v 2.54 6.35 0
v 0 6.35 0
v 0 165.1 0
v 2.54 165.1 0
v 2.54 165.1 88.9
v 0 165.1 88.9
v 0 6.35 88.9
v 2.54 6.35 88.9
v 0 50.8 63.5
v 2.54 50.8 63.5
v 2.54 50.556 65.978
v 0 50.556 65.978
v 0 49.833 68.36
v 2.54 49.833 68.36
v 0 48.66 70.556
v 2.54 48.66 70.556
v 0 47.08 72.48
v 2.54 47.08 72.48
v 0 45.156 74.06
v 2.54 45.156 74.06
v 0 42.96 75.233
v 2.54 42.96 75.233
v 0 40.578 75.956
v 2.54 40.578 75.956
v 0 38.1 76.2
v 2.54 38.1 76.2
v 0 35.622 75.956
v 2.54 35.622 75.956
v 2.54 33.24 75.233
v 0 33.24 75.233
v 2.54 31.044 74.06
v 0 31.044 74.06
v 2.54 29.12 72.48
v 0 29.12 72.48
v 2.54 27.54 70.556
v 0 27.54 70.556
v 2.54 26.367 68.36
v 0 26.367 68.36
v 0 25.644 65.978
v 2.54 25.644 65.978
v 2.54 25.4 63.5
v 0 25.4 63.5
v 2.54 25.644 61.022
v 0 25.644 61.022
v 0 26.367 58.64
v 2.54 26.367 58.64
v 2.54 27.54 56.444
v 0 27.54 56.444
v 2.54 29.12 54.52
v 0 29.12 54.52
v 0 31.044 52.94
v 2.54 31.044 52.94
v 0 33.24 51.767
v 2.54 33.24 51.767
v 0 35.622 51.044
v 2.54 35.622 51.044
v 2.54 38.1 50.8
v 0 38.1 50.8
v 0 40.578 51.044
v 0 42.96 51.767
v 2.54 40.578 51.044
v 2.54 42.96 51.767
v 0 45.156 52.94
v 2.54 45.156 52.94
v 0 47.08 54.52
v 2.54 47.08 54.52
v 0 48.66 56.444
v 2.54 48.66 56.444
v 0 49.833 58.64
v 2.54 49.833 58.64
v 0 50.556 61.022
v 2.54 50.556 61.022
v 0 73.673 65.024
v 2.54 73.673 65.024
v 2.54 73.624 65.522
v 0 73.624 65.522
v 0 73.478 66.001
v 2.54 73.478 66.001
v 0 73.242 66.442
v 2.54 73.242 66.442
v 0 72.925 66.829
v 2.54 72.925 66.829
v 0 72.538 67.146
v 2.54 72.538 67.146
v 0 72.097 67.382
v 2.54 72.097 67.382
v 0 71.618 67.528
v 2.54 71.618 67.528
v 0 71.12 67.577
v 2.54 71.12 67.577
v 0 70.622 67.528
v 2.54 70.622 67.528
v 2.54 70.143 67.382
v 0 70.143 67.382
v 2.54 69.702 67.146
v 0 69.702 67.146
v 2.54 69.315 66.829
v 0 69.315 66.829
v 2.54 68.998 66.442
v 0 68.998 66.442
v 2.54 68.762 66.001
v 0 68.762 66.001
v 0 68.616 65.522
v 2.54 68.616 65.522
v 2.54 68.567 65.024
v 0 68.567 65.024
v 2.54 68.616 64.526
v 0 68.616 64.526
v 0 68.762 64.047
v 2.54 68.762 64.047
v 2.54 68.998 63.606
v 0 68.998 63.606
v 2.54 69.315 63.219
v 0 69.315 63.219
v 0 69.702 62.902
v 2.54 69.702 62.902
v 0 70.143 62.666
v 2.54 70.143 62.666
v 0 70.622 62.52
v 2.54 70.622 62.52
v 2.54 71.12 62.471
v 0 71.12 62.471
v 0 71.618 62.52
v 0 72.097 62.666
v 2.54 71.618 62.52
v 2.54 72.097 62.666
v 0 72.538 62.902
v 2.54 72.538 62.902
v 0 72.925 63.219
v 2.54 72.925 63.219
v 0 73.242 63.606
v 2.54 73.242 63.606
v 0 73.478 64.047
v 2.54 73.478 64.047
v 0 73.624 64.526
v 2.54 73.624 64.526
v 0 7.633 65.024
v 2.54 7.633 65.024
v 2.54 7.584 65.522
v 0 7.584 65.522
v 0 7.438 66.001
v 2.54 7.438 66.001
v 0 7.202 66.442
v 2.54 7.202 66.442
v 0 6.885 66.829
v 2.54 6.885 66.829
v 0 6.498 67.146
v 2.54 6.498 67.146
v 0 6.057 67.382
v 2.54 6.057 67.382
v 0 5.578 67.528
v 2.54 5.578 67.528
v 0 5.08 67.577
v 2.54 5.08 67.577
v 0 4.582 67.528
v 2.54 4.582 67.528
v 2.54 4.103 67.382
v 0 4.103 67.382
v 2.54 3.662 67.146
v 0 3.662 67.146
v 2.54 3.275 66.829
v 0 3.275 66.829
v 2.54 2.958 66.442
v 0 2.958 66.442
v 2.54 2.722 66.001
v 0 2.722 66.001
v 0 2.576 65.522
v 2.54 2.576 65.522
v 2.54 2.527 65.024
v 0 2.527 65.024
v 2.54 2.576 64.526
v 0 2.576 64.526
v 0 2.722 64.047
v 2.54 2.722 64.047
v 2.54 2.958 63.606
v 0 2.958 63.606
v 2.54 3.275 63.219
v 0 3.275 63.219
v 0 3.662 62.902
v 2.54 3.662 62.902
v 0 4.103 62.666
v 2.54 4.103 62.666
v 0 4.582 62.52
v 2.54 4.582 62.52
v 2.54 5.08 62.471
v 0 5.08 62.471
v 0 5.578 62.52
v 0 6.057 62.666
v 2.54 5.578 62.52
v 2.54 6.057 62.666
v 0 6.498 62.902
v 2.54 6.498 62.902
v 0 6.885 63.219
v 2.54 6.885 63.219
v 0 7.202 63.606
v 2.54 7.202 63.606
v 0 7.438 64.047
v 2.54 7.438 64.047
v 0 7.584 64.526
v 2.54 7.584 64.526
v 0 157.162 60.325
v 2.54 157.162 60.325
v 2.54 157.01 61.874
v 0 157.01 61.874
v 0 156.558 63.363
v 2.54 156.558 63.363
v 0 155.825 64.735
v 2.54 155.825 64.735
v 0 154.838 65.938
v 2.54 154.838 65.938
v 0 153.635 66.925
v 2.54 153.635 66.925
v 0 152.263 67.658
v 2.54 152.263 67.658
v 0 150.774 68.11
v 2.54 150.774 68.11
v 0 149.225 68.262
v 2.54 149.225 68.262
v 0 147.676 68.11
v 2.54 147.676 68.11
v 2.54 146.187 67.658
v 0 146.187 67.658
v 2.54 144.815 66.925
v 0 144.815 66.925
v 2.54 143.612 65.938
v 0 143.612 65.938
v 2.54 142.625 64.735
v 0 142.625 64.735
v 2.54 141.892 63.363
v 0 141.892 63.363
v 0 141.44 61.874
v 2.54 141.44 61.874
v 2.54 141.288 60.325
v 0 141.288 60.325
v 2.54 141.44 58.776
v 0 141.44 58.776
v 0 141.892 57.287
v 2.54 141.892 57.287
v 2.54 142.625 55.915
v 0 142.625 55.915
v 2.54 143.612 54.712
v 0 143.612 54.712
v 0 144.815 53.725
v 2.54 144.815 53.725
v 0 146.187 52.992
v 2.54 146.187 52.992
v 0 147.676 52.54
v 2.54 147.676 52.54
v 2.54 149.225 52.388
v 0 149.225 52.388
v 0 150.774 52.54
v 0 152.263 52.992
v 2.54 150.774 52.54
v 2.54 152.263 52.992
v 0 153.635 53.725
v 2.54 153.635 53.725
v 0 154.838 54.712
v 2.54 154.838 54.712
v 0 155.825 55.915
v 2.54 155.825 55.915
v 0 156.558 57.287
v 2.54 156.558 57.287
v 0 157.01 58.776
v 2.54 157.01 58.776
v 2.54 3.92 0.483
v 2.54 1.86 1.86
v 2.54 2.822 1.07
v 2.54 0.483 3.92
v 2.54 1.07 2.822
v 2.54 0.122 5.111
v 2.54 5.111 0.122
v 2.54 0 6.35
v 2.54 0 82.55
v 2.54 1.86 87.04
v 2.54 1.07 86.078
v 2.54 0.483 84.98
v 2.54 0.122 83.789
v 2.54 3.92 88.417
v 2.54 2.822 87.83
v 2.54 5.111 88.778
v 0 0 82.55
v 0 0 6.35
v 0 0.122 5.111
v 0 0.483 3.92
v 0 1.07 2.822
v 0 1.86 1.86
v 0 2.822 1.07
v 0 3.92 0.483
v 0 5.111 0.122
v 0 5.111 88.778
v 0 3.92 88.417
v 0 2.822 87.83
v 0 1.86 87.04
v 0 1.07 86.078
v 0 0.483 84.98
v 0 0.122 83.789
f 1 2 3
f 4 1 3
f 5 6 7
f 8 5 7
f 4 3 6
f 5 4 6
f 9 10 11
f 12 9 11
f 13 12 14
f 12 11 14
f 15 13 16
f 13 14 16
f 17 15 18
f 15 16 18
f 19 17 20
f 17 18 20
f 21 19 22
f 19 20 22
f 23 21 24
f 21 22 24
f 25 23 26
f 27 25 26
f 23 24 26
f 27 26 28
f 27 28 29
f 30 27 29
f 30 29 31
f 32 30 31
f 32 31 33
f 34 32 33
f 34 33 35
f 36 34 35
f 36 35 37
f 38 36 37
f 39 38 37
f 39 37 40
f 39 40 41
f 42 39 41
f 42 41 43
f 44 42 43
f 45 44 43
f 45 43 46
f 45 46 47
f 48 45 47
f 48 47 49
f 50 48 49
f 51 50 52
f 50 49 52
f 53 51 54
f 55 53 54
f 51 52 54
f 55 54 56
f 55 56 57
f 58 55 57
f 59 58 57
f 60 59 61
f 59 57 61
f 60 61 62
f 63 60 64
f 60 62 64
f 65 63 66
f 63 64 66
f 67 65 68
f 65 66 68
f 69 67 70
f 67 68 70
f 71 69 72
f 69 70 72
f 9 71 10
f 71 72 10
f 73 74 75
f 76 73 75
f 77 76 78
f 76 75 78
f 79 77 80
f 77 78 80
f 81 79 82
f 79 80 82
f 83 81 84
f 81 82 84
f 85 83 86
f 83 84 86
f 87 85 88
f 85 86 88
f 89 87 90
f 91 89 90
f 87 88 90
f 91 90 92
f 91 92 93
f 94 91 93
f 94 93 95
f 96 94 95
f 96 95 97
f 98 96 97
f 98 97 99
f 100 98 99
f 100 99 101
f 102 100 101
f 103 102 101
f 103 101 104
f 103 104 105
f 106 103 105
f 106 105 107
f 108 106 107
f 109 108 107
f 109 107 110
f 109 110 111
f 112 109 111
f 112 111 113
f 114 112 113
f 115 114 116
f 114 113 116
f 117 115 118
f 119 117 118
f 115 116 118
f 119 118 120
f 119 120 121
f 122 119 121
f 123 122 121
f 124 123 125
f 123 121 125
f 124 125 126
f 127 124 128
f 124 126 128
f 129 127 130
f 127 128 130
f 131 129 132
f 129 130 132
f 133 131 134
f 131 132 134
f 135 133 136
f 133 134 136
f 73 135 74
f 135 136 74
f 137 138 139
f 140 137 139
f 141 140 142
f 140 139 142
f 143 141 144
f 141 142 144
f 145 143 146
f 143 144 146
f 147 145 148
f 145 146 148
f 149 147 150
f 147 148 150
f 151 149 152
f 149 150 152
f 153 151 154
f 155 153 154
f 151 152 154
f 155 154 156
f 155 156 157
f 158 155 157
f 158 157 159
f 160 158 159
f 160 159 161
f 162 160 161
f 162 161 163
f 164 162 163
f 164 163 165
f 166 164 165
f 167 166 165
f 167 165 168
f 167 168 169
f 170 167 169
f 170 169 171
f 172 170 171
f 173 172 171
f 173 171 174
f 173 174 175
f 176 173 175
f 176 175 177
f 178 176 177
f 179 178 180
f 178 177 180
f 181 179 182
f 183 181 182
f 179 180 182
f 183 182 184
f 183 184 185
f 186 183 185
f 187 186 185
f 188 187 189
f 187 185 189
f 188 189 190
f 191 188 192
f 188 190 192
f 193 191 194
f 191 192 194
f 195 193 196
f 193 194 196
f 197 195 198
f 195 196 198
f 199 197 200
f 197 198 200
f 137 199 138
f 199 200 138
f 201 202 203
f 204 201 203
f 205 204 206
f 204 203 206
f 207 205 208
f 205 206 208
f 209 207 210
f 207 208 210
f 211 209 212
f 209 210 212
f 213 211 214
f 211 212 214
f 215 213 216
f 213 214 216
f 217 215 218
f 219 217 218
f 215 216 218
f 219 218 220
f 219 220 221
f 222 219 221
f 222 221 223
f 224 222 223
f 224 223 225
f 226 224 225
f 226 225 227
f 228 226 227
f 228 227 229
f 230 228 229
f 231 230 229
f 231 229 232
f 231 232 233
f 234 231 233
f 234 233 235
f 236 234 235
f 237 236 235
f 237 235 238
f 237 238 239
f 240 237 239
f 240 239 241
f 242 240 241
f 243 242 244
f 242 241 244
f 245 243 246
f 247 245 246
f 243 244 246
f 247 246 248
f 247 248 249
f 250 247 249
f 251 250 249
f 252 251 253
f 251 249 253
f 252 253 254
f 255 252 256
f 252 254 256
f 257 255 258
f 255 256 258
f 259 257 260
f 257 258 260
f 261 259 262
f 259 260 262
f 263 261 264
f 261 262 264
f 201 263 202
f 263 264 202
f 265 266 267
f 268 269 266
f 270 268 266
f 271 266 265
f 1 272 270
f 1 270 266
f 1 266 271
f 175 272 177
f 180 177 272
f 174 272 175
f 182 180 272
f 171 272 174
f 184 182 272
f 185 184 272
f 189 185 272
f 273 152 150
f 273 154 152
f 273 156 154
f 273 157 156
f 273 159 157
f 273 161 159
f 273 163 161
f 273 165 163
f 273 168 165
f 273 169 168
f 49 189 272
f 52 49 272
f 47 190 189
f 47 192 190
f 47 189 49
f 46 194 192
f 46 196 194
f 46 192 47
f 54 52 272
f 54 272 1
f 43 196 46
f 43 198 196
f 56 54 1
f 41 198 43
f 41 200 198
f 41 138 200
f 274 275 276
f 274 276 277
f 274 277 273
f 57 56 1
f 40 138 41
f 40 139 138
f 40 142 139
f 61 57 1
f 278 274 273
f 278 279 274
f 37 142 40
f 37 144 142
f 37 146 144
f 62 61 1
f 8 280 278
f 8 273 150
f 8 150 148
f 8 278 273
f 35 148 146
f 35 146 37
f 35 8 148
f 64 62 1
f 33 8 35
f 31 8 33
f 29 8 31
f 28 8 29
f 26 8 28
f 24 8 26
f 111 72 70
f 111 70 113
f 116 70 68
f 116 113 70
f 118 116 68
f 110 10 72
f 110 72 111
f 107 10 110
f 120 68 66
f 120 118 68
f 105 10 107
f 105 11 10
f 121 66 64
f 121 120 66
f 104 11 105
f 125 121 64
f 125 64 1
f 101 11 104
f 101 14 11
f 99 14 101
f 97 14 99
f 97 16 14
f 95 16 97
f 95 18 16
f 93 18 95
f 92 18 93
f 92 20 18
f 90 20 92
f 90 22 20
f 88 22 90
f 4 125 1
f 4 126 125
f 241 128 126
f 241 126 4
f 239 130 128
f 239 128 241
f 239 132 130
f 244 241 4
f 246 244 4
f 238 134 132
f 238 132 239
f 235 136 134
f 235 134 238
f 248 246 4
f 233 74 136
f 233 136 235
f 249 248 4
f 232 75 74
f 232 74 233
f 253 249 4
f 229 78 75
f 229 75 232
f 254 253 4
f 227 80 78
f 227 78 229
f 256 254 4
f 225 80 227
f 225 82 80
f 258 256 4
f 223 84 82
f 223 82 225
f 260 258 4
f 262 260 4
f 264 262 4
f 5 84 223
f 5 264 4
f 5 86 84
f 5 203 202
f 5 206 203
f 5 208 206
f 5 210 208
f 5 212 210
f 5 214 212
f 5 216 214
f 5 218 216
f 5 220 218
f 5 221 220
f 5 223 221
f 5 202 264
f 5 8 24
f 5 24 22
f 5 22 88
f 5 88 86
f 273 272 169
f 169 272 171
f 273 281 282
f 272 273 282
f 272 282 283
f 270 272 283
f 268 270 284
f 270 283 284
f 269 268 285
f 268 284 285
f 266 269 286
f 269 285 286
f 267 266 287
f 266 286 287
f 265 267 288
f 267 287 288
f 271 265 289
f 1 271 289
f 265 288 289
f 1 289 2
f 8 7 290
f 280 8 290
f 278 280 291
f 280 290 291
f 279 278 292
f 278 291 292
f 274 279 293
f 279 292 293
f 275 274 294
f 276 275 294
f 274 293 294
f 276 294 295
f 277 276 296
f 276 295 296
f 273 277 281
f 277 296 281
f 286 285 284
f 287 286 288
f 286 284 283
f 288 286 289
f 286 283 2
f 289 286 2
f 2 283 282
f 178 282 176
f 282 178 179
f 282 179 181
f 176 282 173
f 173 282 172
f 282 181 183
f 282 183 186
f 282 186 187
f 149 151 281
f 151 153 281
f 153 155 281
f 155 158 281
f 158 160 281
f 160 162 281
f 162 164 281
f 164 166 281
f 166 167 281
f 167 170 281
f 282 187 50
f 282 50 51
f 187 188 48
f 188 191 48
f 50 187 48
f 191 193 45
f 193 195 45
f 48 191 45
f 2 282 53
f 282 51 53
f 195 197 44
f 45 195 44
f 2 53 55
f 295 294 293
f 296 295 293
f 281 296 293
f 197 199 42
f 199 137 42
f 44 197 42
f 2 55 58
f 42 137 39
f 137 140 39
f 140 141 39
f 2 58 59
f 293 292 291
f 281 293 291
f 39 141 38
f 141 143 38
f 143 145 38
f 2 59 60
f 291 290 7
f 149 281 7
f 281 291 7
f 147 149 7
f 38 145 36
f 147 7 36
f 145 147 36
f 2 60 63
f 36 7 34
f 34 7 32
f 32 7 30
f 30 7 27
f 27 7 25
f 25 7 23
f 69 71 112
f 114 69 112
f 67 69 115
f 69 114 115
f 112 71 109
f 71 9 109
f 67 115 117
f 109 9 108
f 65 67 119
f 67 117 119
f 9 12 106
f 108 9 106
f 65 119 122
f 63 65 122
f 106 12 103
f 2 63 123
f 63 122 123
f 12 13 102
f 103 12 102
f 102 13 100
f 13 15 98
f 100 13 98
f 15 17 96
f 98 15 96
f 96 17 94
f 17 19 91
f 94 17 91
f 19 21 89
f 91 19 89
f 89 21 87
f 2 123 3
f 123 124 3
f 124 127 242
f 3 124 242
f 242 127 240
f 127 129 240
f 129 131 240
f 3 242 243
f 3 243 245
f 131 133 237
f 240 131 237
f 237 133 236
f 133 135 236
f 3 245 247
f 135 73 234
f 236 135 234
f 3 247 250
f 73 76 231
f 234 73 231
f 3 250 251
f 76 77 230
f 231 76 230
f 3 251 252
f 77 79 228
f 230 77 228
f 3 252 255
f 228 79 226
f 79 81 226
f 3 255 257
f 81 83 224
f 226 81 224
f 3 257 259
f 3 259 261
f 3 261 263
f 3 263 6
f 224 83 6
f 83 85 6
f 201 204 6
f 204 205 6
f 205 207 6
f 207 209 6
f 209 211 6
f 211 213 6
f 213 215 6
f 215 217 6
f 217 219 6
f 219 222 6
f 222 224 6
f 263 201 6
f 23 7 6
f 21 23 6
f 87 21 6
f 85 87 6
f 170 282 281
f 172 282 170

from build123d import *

# Parameters (mm, degrees)
F1_DEPTH = 2.54
F2_R     = 12.7
F3_DEPTH = 2.541
F2_R_2   = 7.9375
F4_DEPTH = 25.4
F5_R     = 2.5527
F6_DEPTH = 25.4


# Not quite as in the source:
# - a feature names something its author has since deleted; it is built from what else it names


with BuildPart() as f1:
    # F0 (on Right) → F1 (new body)
    with BuildSketch(Plane.YZ):
        with BuildLine():
            ThreePointArc((0, 6.35), (1.8598719395, 1.8598719395), (6.35, 0))
            Line((6.35, 0), (165.1, 0))
            Line((165.1, 0), (165.1, 88.9))
            Line((165.1, 88.9), (6.35, 88.9))
            ThreePointArc((6.35, 88.9), (1.8598719395, 87.0401280605), (0, 82.55))
            Line((0, 82.55), (0, 6.35))
        make_face()
    extrude(amount=F1_DEPTH)

    # F2 (on face) → F3 (cut, through all)
    with BuildSketch(Plane.YZ.offset(2.54)):
        with Locations((38.1, 63.5)):
            Circle(F2_R)
    extrude(amount=-F3_DEPTH, mode=Mode.SUBTRACT)

    # F2 (on face) → F4 (cut)
    with BuildSketch(Plane.YZ.offset(2.54)):
        with Locations((38.1, 63.5)):
            Circle(F2_R)
        with Locations((149.225, 60.325)):
            Circle(F2_R_2)
    extrude(amount=-F4_DEPTH, mode=Mode.SUBTRACT)

    # F5 (on face) → F6 (cut)
    with BuildSketch(Plane.YZ.offset(2.54)):
        with Locations((5.08, 65.024)):
            Circle(F5_R)
        with Locations((71.12, 65.024)):
            Circle(F5_R)
    extrude(amount=-F6_DEPTH, mode=Mode.SUBTRACT)


solid = f1.part
